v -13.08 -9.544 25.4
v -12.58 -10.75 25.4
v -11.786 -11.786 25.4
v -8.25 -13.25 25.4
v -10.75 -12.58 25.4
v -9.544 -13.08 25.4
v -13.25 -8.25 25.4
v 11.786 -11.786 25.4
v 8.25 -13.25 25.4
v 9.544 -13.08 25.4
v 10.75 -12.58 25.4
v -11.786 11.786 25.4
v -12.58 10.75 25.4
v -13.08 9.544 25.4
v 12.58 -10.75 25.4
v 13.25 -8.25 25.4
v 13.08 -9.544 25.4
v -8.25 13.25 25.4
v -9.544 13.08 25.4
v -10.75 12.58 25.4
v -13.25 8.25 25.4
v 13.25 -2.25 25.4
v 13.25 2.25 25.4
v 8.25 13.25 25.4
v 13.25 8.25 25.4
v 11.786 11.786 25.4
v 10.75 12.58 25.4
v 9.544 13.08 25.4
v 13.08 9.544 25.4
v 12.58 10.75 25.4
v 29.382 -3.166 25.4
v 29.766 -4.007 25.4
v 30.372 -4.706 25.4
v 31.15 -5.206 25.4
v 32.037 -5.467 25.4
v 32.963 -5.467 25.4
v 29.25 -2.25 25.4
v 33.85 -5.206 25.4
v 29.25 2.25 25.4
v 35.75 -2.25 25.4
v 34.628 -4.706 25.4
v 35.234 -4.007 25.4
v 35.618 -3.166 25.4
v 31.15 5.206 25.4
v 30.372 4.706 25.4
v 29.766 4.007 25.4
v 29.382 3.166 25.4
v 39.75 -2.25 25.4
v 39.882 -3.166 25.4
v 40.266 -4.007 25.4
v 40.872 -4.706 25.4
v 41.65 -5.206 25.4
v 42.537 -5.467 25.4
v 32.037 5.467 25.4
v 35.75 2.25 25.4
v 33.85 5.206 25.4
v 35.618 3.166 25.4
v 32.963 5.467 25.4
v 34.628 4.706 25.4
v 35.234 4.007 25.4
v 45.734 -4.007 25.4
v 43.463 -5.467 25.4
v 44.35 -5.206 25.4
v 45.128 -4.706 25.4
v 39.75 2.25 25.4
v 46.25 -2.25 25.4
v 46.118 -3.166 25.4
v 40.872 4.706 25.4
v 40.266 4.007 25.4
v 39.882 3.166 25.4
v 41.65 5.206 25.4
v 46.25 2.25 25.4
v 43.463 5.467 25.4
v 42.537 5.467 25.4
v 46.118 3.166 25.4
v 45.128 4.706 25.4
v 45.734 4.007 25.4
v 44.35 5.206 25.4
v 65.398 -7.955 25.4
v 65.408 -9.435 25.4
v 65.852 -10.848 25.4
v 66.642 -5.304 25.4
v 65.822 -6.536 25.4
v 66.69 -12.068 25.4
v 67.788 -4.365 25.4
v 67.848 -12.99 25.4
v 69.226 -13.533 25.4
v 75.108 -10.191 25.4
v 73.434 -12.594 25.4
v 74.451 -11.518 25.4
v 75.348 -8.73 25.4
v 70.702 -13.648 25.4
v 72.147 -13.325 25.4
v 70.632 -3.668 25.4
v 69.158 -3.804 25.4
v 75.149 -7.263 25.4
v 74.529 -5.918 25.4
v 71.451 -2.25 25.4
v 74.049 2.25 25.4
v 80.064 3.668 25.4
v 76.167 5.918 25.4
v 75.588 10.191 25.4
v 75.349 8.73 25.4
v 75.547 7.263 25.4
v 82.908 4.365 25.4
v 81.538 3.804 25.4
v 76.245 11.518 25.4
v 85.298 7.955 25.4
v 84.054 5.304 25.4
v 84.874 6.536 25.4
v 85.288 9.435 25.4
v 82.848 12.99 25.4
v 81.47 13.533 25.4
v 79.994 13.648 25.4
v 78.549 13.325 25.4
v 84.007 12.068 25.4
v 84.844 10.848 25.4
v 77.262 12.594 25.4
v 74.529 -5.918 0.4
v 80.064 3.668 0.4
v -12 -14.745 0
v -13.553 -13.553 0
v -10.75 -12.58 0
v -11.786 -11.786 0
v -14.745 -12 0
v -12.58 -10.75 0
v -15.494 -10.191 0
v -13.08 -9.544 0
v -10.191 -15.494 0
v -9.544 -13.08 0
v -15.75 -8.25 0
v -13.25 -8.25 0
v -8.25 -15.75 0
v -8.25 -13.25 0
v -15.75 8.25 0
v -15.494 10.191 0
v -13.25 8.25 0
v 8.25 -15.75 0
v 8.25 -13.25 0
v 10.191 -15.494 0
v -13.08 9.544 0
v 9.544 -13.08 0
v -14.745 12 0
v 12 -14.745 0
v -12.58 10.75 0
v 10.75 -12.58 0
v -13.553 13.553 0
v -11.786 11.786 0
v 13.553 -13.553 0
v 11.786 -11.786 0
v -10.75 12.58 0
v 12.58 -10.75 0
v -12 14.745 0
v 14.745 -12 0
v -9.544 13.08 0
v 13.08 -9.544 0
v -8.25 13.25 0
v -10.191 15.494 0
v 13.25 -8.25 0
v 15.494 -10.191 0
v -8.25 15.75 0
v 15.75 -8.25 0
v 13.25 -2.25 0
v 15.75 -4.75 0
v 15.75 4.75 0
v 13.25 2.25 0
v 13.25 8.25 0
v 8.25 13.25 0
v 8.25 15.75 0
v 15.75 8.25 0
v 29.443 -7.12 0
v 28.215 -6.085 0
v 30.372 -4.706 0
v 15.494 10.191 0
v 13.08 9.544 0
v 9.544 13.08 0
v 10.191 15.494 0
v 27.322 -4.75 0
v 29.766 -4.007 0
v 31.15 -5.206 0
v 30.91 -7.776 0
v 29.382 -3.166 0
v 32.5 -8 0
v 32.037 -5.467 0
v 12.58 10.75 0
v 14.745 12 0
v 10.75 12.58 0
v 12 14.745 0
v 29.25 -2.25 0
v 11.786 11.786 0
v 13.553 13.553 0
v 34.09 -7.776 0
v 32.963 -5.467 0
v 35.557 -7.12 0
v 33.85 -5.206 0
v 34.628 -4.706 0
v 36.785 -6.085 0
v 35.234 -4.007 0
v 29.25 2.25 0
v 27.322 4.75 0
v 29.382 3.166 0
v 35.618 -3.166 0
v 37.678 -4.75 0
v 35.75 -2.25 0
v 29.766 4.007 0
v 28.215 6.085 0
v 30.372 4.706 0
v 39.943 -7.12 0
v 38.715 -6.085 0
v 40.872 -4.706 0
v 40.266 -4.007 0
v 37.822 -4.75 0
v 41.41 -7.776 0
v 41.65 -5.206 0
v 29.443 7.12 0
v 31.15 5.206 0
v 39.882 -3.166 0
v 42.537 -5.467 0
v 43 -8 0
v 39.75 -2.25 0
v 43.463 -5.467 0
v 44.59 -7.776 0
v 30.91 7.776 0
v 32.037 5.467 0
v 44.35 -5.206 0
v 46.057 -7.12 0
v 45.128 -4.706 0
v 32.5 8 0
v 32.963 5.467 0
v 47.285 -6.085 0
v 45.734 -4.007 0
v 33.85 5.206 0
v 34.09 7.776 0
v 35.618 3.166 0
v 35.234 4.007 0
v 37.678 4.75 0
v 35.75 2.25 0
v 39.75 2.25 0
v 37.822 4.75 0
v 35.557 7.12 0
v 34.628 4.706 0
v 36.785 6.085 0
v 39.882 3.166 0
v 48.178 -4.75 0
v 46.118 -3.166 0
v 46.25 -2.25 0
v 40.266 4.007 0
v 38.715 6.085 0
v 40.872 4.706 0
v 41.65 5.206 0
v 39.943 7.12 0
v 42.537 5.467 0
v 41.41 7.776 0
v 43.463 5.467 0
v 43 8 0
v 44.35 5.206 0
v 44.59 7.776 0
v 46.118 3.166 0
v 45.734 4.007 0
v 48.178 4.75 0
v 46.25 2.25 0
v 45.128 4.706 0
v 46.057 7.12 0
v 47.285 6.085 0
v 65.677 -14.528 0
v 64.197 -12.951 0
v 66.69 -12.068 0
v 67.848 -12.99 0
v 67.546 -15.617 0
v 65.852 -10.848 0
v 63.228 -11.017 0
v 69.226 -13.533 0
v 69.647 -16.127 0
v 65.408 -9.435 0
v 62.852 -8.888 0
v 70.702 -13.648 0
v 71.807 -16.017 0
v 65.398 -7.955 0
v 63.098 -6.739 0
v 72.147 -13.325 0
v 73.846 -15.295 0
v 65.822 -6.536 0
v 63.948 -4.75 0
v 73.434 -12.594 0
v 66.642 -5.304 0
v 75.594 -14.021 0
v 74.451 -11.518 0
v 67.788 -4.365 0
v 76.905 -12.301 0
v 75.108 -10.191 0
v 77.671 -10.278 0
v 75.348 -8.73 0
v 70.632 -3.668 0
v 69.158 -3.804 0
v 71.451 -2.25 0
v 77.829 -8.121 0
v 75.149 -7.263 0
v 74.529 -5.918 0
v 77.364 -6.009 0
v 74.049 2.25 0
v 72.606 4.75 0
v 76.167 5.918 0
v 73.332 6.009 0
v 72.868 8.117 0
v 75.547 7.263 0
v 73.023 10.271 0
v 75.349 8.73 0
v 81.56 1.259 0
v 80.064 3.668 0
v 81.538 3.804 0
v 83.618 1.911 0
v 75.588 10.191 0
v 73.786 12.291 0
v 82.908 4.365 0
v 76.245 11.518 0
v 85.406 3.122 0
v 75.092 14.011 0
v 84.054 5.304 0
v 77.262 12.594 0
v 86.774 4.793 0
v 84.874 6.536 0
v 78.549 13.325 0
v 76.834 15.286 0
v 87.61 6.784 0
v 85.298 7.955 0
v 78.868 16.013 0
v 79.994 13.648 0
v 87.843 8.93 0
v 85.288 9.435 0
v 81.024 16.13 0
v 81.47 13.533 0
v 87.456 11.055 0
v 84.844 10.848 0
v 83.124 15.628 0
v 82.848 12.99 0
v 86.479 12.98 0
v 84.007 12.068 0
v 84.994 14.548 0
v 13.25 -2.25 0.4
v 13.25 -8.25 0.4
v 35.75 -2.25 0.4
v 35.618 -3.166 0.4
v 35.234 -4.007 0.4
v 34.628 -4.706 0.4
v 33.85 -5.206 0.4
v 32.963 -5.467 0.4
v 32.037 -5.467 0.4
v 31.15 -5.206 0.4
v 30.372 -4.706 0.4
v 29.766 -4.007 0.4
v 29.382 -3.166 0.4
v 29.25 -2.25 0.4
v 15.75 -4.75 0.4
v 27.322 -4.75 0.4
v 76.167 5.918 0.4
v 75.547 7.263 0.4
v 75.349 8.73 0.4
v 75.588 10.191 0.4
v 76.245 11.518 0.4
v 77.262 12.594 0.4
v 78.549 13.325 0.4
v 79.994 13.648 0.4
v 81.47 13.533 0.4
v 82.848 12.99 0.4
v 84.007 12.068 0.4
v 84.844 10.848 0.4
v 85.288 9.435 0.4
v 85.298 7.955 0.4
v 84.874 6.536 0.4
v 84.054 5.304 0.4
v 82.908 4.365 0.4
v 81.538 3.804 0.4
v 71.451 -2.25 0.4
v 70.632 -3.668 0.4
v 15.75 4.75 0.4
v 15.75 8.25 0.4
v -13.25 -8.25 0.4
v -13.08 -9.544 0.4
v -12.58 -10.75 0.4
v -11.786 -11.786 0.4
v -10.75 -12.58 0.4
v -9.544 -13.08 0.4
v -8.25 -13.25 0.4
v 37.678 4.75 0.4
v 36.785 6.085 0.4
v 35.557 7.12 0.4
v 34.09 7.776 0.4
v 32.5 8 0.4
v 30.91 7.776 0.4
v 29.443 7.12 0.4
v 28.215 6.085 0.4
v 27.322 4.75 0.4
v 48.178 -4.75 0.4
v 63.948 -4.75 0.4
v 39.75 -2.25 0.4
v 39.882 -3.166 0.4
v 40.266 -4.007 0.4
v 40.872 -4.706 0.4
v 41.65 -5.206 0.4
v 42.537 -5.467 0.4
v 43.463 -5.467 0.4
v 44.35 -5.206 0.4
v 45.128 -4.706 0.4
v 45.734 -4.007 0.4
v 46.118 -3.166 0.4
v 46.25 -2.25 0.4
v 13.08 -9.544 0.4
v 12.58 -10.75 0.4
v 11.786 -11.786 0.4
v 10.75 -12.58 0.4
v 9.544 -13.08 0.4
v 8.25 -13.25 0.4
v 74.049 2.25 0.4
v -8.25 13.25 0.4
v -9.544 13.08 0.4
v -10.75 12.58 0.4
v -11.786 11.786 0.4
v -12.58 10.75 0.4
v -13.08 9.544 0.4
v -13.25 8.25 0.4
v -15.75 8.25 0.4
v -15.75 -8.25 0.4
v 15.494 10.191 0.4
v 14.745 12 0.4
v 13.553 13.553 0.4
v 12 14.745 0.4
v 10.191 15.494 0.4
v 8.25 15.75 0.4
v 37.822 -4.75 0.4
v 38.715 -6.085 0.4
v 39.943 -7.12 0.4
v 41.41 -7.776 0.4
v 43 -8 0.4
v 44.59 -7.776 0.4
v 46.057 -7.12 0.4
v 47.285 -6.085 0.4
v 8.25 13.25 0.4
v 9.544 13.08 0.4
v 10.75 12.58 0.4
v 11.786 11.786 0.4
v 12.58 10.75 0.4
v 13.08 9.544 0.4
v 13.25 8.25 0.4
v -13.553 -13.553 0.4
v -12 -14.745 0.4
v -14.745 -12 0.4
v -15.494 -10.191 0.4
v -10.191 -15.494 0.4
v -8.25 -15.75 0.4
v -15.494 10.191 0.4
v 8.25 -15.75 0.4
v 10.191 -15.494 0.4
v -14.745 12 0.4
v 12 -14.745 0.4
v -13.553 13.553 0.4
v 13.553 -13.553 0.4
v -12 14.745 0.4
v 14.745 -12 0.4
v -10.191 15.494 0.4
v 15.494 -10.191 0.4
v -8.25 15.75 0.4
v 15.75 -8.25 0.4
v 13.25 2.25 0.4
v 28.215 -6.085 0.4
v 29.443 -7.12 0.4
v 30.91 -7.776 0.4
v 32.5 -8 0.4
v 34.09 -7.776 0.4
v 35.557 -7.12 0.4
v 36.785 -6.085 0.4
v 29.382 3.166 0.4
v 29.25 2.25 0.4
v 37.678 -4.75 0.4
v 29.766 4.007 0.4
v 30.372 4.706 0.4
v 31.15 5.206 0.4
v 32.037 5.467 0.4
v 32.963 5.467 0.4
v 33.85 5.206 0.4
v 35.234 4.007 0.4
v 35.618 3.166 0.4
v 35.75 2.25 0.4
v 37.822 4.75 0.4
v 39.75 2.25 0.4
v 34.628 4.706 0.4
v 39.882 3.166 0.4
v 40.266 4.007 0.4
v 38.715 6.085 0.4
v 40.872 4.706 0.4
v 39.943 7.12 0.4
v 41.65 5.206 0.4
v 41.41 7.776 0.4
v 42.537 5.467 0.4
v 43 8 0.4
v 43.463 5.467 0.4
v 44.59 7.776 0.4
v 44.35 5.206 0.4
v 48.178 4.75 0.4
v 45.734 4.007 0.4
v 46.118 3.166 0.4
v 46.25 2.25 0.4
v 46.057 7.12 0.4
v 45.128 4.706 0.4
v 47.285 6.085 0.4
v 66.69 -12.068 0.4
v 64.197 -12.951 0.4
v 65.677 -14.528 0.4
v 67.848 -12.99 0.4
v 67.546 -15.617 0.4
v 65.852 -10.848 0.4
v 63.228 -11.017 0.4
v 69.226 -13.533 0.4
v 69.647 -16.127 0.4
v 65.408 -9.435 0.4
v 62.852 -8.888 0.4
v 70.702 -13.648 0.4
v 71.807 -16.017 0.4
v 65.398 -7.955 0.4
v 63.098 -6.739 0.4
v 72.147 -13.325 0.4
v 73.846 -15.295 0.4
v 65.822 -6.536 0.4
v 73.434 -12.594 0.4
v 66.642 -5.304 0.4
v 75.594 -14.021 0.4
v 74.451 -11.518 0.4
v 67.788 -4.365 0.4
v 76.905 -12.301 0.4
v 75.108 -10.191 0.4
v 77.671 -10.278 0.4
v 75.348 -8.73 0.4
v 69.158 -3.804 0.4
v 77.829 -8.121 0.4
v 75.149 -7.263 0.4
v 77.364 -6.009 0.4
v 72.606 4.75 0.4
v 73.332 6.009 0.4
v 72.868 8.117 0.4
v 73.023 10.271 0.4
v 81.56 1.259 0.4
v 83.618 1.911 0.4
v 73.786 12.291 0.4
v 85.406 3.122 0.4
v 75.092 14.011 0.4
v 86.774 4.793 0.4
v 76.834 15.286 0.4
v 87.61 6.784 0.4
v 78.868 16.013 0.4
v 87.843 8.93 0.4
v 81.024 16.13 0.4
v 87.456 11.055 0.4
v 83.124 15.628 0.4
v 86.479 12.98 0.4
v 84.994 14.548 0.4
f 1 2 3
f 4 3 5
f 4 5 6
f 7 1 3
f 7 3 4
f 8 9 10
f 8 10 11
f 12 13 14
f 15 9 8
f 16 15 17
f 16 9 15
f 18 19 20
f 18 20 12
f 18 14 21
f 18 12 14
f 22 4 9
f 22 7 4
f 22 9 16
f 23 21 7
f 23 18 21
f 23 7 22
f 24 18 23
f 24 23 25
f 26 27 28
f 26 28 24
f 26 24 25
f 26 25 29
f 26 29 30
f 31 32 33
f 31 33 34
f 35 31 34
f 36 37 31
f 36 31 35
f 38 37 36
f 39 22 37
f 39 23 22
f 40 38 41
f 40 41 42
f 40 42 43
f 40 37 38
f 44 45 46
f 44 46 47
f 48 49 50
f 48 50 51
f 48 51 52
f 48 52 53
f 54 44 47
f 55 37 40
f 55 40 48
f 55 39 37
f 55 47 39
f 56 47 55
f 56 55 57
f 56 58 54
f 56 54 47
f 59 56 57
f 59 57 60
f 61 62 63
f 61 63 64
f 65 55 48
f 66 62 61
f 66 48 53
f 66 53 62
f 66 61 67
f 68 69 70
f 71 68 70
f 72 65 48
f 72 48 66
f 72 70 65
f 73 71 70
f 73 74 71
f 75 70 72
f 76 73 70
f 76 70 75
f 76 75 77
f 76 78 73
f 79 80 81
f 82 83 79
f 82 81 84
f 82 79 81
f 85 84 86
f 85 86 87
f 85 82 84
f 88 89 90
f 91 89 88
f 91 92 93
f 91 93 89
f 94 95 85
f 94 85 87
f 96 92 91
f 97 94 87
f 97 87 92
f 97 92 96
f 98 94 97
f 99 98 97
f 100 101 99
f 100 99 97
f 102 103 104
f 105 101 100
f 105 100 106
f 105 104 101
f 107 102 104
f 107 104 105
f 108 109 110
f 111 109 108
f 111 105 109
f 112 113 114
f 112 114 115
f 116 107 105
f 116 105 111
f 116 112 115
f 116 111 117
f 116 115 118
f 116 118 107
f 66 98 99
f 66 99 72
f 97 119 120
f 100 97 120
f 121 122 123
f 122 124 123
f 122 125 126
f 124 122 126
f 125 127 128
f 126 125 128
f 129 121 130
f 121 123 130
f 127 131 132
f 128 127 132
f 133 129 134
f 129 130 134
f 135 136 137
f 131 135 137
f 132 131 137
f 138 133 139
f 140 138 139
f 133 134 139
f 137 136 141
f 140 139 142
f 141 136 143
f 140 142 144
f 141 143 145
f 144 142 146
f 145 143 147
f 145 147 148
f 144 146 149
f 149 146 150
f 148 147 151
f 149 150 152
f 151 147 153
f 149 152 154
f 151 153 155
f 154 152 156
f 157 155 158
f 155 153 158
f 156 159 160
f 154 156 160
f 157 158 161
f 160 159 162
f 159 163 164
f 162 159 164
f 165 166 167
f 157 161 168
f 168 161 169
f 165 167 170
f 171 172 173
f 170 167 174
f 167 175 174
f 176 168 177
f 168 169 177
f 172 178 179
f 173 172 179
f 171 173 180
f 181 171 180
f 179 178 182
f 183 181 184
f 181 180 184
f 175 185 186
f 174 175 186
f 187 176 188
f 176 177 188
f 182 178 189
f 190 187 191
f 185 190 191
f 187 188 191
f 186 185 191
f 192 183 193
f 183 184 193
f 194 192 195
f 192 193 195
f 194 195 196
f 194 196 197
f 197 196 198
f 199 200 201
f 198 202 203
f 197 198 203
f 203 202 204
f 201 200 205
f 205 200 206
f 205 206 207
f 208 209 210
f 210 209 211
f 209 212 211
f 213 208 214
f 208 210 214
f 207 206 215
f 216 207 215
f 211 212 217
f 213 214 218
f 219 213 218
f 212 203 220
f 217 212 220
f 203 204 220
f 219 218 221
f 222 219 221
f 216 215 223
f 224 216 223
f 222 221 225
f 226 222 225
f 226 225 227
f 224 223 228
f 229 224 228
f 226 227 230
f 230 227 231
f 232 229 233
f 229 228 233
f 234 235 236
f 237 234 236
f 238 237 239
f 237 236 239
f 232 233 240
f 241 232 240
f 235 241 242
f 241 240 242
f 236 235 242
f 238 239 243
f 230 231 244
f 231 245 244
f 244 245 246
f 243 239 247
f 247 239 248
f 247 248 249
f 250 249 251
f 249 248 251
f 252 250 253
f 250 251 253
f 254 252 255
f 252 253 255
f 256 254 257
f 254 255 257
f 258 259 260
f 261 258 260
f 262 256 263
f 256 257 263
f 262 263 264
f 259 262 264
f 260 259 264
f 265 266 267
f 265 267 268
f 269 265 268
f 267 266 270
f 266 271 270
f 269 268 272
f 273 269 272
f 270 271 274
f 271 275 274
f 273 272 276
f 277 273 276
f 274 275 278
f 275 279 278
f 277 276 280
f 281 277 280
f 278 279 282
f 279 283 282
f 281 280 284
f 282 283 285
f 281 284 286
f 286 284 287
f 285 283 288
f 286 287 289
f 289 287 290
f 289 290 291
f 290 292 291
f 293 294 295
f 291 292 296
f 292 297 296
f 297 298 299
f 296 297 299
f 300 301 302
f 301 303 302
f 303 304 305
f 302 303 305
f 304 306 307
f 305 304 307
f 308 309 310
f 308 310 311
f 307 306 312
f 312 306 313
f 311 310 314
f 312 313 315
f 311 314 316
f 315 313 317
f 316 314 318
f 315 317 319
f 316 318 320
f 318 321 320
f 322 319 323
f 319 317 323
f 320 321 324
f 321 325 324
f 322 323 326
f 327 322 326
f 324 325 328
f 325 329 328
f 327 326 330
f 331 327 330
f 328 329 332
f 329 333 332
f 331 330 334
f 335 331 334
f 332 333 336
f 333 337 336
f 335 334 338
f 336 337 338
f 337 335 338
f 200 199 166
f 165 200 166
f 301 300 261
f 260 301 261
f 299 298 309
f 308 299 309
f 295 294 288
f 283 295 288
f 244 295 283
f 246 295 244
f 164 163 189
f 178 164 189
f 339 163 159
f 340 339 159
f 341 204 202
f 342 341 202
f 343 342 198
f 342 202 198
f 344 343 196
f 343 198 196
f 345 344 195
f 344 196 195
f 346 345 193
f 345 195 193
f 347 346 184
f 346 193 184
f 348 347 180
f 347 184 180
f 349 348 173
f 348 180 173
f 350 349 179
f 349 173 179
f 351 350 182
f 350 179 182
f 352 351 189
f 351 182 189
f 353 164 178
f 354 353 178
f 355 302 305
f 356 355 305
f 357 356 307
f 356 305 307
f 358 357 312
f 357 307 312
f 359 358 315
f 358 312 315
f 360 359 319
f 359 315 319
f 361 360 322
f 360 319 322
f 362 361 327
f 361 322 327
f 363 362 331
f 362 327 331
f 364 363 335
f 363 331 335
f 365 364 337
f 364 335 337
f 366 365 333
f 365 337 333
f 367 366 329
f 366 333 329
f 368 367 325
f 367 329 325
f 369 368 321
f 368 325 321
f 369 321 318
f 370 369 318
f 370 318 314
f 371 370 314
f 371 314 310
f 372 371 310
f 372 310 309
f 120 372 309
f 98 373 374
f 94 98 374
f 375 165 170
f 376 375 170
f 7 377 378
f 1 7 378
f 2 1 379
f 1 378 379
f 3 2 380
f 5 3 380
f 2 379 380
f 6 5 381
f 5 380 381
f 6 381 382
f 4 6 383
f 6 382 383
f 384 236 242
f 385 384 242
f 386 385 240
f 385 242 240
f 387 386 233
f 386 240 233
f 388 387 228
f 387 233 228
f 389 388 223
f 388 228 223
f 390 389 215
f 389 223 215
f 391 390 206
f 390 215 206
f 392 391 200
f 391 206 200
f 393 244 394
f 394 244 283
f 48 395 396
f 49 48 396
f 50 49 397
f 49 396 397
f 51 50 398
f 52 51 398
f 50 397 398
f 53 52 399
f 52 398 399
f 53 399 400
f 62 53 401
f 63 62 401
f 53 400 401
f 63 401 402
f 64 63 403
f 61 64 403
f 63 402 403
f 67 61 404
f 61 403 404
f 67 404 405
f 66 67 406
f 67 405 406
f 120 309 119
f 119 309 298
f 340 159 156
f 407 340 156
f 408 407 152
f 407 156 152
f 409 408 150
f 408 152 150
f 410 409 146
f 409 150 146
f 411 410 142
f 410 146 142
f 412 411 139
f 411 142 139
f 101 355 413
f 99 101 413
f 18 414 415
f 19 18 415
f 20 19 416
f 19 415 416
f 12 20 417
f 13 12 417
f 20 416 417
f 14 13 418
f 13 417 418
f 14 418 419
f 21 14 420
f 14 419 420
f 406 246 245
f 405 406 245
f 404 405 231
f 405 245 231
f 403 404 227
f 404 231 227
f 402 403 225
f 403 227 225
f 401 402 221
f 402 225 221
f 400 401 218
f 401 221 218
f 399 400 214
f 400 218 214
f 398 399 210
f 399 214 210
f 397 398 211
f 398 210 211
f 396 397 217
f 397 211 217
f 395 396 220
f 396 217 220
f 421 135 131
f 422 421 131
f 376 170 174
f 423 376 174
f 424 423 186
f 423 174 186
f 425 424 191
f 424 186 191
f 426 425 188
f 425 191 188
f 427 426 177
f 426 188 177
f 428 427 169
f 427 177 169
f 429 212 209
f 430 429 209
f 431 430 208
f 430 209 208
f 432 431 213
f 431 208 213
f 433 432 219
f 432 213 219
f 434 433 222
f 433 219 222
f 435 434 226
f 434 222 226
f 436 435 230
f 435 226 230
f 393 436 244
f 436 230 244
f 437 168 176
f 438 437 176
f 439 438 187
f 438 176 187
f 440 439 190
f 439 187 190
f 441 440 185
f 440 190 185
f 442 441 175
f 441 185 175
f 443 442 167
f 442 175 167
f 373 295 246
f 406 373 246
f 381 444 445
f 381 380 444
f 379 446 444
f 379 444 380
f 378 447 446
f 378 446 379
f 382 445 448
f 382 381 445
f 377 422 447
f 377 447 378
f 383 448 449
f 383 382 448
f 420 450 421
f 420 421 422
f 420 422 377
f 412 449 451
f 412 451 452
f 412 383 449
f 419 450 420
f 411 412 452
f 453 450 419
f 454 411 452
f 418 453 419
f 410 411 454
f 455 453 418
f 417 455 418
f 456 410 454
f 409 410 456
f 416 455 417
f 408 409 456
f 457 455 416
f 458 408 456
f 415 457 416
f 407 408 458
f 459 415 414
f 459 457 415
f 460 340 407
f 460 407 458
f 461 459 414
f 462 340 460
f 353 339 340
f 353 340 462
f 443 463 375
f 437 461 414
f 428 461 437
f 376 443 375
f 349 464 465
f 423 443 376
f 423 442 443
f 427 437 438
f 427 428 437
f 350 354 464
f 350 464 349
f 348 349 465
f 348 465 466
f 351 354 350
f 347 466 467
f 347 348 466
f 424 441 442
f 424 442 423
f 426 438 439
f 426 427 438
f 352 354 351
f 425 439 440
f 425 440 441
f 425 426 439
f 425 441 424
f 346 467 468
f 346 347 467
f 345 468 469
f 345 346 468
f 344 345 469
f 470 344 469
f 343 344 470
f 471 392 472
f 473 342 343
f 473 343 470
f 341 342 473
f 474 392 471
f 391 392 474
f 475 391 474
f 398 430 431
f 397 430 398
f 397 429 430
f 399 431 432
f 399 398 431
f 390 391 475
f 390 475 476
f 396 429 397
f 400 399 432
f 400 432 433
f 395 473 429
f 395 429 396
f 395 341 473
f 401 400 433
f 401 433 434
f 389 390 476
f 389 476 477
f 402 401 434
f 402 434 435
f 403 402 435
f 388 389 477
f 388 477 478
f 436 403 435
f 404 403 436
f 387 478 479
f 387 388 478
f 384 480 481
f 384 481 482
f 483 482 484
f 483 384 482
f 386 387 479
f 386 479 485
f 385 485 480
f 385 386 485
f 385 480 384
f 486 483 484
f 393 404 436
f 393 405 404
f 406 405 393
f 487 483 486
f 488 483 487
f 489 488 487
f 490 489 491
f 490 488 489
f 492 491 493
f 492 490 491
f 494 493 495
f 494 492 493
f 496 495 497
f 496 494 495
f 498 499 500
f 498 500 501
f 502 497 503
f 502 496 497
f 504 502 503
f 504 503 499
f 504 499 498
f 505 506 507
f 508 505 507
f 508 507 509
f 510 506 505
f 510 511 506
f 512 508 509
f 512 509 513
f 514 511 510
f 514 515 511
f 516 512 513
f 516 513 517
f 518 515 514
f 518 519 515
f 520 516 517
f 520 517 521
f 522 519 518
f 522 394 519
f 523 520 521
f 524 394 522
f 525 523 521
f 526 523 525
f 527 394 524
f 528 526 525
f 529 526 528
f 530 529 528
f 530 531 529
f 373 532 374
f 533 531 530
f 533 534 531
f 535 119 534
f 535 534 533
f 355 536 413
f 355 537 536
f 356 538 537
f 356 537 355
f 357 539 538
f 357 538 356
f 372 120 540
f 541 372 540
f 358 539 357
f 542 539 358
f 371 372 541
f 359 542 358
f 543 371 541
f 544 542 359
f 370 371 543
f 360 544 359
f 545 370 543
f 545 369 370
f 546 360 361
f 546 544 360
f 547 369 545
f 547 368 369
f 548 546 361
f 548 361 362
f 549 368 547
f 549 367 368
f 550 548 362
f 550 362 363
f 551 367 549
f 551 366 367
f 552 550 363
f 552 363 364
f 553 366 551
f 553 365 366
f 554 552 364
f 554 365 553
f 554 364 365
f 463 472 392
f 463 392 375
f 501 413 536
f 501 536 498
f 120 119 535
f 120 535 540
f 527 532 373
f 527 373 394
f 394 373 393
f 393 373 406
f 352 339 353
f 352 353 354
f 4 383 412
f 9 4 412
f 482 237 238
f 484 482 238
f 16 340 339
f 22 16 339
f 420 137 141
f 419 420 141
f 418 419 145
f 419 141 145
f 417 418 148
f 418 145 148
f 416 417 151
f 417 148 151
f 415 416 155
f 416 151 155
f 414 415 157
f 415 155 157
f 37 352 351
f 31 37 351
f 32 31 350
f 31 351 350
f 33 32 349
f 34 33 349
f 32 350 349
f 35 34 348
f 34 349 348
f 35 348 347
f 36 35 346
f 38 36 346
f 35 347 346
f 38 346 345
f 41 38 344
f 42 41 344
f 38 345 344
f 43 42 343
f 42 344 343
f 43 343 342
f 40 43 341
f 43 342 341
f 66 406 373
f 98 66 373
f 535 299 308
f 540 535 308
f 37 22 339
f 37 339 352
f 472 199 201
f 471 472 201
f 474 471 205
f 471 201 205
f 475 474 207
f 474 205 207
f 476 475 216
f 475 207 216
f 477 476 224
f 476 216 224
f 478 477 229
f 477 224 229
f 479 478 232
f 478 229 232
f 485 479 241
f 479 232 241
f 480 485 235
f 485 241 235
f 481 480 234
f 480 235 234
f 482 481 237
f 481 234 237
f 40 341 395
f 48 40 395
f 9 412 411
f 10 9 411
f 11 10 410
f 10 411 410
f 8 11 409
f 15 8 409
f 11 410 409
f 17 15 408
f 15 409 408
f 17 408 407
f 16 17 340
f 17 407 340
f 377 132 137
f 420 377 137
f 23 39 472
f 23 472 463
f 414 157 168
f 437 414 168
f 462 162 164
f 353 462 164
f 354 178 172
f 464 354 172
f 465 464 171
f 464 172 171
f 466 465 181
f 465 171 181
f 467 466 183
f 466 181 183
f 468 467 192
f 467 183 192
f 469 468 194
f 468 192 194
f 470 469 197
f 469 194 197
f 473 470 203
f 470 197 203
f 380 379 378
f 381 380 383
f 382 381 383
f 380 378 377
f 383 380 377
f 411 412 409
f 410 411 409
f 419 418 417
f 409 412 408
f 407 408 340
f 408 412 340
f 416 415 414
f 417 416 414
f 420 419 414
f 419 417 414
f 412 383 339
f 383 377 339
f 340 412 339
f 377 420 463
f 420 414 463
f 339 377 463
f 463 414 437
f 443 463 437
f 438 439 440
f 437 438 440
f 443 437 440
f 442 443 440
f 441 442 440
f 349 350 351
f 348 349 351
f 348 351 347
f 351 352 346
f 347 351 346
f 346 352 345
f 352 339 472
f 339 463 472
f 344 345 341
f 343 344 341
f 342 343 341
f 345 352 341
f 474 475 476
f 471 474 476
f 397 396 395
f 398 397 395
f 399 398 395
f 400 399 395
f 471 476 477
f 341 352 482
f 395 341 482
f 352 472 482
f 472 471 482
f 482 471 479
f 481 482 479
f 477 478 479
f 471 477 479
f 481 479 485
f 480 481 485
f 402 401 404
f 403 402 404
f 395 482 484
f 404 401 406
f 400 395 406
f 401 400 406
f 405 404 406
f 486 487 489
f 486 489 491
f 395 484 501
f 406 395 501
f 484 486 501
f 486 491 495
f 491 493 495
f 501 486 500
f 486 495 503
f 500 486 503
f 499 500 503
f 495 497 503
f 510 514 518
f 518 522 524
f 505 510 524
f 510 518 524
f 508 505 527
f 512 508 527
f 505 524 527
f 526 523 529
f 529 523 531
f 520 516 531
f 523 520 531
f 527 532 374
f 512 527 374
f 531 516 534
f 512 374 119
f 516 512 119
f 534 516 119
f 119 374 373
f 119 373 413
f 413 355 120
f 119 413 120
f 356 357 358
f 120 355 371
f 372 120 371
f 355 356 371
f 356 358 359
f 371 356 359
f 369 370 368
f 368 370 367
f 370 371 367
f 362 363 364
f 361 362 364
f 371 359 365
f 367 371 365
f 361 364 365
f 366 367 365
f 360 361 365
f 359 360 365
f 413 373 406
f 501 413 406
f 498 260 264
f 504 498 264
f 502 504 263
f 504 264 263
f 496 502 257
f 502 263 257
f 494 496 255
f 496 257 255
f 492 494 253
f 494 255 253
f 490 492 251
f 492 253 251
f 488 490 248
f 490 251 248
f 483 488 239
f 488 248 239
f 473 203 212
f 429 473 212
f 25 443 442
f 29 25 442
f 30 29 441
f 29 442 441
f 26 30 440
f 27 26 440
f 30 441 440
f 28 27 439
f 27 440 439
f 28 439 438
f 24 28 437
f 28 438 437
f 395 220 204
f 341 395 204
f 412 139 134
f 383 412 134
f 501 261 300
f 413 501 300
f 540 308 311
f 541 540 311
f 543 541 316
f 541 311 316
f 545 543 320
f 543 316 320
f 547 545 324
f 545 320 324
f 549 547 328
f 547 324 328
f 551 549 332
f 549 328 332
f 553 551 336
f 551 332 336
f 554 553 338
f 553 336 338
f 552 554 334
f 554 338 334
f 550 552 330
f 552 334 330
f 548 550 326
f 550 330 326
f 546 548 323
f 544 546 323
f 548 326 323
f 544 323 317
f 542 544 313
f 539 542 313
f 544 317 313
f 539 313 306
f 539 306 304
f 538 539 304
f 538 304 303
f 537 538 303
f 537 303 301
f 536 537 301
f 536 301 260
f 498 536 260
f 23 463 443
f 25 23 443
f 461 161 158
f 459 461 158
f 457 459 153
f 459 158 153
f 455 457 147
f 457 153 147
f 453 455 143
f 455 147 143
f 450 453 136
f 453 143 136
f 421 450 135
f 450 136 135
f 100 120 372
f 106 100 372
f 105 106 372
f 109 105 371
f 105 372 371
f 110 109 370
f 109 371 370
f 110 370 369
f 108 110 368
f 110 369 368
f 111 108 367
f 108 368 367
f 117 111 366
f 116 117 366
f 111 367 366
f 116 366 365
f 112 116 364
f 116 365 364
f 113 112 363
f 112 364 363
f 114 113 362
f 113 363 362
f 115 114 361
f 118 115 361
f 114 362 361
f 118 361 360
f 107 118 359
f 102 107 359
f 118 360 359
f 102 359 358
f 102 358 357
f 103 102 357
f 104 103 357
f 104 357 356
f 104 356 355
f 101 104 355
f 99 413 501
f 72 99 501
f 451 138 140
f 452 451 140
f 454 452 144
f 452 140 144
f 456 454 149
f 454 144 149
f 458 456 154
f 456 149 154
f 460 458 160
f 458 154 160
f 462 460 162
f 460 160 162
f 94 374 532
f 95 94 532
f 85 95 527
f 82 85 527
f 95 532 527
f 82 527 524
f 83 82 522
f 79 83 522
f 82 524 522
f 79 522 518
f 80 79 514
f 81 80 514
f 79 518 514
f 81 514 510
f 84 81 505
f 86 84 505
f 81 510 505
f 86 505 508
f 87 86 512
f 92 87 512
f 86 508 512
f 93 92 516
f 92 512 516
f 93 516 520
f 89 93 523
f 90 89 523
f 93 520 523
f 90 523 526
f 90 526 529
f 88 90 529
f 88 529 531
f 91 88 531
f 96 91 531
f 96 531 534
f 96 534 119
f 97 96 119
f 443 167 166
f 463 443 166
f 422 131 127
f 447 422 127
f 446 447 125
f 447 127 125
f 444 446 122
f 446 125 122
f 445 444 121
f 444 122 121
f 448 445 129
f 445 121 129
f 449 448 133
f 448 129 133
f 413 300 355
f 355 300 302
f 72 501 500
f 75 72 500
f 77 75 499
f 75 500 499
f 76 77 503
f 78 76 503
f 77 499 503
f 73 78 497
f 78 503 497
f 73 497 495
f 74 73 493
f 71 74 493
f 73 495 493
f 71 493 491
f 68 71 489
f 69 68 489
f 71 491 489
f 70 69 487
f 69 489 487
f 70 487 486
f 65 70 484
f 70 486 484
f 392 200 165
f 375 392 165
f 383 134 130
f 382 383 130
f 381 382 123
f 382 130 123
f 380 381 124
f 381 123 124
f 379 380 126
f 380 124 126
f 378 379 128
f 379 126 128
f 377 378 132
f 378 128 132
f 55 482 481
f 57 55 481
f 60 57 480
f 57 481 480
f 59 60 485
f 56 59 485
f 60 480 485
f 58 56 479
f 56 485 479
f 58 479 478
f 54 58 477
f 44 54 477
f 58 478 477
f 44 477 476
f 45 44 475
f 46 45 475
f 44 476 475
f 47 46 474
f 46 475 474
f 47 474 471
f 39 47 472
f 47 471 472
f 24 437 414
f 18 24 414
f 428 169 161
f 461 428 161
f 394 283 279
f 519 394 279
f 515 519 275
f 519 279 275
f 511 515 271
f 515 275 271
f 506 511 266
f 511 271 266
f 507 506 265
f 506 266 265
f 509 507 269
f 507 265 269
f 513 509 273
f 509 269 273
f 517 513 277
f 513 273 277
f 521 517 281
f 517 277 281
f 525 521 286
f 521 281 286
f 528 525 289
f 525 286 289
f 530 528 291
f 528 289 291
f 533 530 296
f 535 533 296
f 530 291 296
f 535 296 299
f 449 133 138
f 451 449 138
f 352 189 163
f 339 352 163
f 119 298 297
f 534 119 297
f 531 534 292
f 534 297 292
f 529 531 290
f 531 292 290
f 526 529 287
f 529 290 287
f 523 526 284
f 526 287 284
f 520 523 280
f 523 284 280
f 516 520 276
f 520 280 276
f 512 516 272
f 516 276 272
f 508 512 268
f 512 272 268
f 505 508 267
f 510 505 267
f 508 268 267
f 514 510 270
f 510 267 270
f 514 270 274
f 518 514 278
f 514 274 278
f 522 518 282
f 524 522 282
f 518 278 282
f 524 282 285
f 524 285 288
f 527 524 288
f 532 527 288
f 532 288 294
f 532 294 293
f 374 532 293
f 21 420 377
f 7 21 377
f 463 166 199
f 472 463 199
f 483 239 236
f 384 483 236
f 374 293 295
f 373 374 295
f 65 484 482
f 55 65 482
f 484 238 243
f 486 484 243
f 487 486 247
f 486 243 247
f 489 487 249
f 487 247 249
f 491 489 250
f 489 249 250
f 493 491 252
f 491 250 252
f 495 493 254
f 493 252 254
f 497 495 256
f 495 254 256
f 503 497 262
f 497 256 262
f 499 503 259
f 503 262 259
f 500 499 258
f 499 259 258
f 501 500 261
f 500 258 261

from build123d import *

# Parameters (mm, degrees)
F1_DEPTH = 0.4
F3_DEPTH = 25


with BuildPart() as f1:
    # F0 (on Top) → F1 (new body)
    with BuildSketch(Plane.XY):
        with BuildLine():
            Line((27.3219212057, 4.75), (15.75, 4.75))
            Line((15.75, 4.75), (15.75, 8.25))
            ThreePointArc((15.75, 8.25), (13.5533008589, 13.5533008589), (8.25, 15.75))
            Line((8.25, 15.75), (-8.25, 15.75))
            ThreePointArc((-8.25, 15.75), (-13.5533008589, 13.5533008589), (-15.75, 8.25))
            Line((-15.75, 8.25), (-15.75, -8.25))
            ThreePointArc((-15.75, -8.25), (-13.5533008589, -13.5533008589), (-8.25, -15.75))
            Line((-8.25, -15.75), (8.25, -15.75))
            ThreePointArc((8.25, -15.75), (13.5533008589, -13.5533008589), (15.75, -8.25))
            Line((15.75, -8.25), (15.75, -4.75))
            Line((15.75, -4.75), (27.3219212057, -4.75))
            ThreePointArc((27.3219212057, -4.75), (32.5, -8), (37.6780787943, -4.75))
            Line((37.6780787943, -4.75), (37.75, -4.75))
            Line((37.75, -4.75), (37.8219212057, -4.75))
            ThreePointArc((37.8219212057, -4.75), (43, -8), (48.1780787943, -4.75))
            Line((48.1780787943, -4.75), (63.9480829801, -4.75))
            ThreePointArc((63.9480829801, -4.75), (69.6474451199, -16.1274567319), (77.3637435709, -6.0087617221))
            Line((77.3637435709, -6.0087617221), (81.5596501878, 1.2587617221))
            ThreePointArc((81.5596501878, 1.2587617221), (84.0980762114, 15.1554445662), (73.3324088518, 6.0087617221))
            Line((73.3324088518, 6.0087617221), (72.6056624327, 4.75))
            Line((72.6056624327, 4.75), (48.1780787943, 4.75))
            ThreePointArc((48.1780787943, 4.75), (43, 8), (37.8219212057, 4.75))
            Line((37.8219212057, 4.75), (37.75, 4.75))
            Line((37.75, 4.75), (37.6780787943, 4.75))
            ThreePointArc((37.6780787943, 4.75), (32.5, 8), (27.3219212057, 4.75))
        make_face()
        with BuildLine():
            ThreePointArc((13.25, -8.25), (11.7855339059, -11.7855339059), (8.25, -13.25))
            Line((8.25, -13.25), (4.5, -13.25))
            Line((4.5, -13.25), (-4.5, -13.25))
            Line((-4.5, -13.25), (-8.25, -13.25))
            ThreePointArc((-8.25, -13.25), (-11.7855339059, -11.7855339059), (-13.25, -8.25))
            Line((-13.25, -8.25), (-13.25, -4.5))
            Line((-13.25, -4.5), (-13.25, 4.5))
            Line((-13.25, 4.5), (-13.25, 8.25))
            ThreePointArc((-13.25, 8.25), (-11.7855339059, 11.7855339059), (-8.25, 13.25))
            Line((-8.25, 13.25), (-4.5, 13.25))
            Line((-4.5, 13.25), (4.5, 13.25))
            Line((4.5, 13.25), (8.25, 13.25))
            ThreePointArc((8.25, 13.25), (11.7855339059, 11.7855339059), (13.25, 8.25))
            Line((13.25, 8.25), (13.25, 4.5))
            Line((13.25, 4.5), (13.25, 2.25))
            Line((13.25, 2.25), (29.25, 2.25))
            ThreePointArc((29.25, 2.25), (32.5, 5.5), (35.75, 2.25))
            Line((35.75, 2.25), (37.75, 2.25))
            Line((37.75, 2.25), (39.75, 2.25))
            ThreePointArc((39.75, 2.25), (43, 5.5), (46.25, 2.25))
            Line((46.25, 2.25), (74.0490381057, 2.25))
            Line((74.0490381057, 2.25), (76.1669476654, 5.9183269633))
            ThreePointArc((76.1669476654, 5.9183269633), (82.8480762114, 12.9903810568), (80.0640619824, 3.6683269633))
            Line((80.0640619824, 3.6683269633), (74.5292047573, -5.9183269633))
            ThreePointArc((74.5292047573, -5.9183269633), (67.8480762114, -12.9903810568), (70.6320904403, -3.6683269633))
            Line((70.6320904403, -3.6683269633), (71.4509618943, -2.25))
            Line((71.4509618943, -2.25), (46.25, -2.25))
            ThreePointArc((46.25, -2.25), (43, -5.5), (39.75, -2.25))
            Line((39.75, -2.25), (37.75, -2.25))
            Line((37.75, -2.25), (35.75, -2.25))
            ThreePointArc((35.75, -2.25), (32.5, -5.5), (29.25, -2.25))
            Line((29.25, -2.25), (13.25, -2.25))
            Line((13.25, -2.25), (13.25, -4.5))
            Line((13.25, -4.5), (13.25, -8.25))
        make_face(mode=Mode.SUBTRACT)
    extrude(amount=F1_DEPTH)


with BuildPart() as f3:
    # F2 (on face) → F3 (new body)
    with BuildSketch(Plane.XY.offset(0.4)):
        with BuildLine():
            ThreePointArc((8.25, -13.25), (11.7855339059, -11.7855339059), (13.25, -8.25))
            Line((13.25, -8.25), (13.25, -2.25))
            Line((13.25, -2.25), (29.25, -2.25))
            ThreePointArc((29.25, -2.25), (32.5, -5.5), (35.75, -2.25))
            Line((35.75, -2.25), (39.75, -2.25))
            ThreePointArc((39.75, -2.25), (43, -5.5), (46.25, -2.25))
            Line((46.25, -2.25), (71.4509618943, -2.25))
            Line((71.4509618943, -2.25), (70.6320904403, -3.6683269633))
            ThreePointArc((70.6320904403, -3.6683269633), (67.8480762114, -12.9903810568), (74.5292047573, -5.9183269633))
            Line((74.5292047573, -5.9183269633), (80.0640619824, 3.6683269633))
            ThreePointArc((80.0640619824, 3.6683269633), (82.8480762114, 12.9903810568), (76.1669476654, 5.9183269633))
            Line((76.1669476654, 5.9183269633), (74.0490381057, 2.25))
            Line((74.0490381057, 2.25), (46.25, 2.25))
            ThreePointArc((46.25, 2.25), (43, 5.5), (39.75, 2.25))
            Line((39.75, 2.25), (35.75, 2.25))
            ThreePointArc((35.75, 2.25), (32.5, 5.5), (29.25, 2.25))
            Line((29.25, 2.25), (13.25, 2.25))
            Line((13.25, 2.25), (13.25, 8.25))
            ThreePointArc((13.25, 8.25), (11.7855339059, 11.7855339059), (8.25, 13.25))
            Line((8.25, 13.25), (-8.25, 13.25))
            ThreePointArc((-8.25, 13.25), (-11.7855339059, 11.7855339059), (-13.25, 8.25))
            Line((-13.25, 8.25), (-13.25, -8.25))
            ThreePointArc((-13.25, -8.25), (-11.7855339059, -11.7855339059), (-8.25, -13.25))
            Line((-8.25, -13.25), (8.25, -13.25))
        make_face()
    extrude(amount=F3_DEPTH)


solid = Compound([f1.part, f3.part])
